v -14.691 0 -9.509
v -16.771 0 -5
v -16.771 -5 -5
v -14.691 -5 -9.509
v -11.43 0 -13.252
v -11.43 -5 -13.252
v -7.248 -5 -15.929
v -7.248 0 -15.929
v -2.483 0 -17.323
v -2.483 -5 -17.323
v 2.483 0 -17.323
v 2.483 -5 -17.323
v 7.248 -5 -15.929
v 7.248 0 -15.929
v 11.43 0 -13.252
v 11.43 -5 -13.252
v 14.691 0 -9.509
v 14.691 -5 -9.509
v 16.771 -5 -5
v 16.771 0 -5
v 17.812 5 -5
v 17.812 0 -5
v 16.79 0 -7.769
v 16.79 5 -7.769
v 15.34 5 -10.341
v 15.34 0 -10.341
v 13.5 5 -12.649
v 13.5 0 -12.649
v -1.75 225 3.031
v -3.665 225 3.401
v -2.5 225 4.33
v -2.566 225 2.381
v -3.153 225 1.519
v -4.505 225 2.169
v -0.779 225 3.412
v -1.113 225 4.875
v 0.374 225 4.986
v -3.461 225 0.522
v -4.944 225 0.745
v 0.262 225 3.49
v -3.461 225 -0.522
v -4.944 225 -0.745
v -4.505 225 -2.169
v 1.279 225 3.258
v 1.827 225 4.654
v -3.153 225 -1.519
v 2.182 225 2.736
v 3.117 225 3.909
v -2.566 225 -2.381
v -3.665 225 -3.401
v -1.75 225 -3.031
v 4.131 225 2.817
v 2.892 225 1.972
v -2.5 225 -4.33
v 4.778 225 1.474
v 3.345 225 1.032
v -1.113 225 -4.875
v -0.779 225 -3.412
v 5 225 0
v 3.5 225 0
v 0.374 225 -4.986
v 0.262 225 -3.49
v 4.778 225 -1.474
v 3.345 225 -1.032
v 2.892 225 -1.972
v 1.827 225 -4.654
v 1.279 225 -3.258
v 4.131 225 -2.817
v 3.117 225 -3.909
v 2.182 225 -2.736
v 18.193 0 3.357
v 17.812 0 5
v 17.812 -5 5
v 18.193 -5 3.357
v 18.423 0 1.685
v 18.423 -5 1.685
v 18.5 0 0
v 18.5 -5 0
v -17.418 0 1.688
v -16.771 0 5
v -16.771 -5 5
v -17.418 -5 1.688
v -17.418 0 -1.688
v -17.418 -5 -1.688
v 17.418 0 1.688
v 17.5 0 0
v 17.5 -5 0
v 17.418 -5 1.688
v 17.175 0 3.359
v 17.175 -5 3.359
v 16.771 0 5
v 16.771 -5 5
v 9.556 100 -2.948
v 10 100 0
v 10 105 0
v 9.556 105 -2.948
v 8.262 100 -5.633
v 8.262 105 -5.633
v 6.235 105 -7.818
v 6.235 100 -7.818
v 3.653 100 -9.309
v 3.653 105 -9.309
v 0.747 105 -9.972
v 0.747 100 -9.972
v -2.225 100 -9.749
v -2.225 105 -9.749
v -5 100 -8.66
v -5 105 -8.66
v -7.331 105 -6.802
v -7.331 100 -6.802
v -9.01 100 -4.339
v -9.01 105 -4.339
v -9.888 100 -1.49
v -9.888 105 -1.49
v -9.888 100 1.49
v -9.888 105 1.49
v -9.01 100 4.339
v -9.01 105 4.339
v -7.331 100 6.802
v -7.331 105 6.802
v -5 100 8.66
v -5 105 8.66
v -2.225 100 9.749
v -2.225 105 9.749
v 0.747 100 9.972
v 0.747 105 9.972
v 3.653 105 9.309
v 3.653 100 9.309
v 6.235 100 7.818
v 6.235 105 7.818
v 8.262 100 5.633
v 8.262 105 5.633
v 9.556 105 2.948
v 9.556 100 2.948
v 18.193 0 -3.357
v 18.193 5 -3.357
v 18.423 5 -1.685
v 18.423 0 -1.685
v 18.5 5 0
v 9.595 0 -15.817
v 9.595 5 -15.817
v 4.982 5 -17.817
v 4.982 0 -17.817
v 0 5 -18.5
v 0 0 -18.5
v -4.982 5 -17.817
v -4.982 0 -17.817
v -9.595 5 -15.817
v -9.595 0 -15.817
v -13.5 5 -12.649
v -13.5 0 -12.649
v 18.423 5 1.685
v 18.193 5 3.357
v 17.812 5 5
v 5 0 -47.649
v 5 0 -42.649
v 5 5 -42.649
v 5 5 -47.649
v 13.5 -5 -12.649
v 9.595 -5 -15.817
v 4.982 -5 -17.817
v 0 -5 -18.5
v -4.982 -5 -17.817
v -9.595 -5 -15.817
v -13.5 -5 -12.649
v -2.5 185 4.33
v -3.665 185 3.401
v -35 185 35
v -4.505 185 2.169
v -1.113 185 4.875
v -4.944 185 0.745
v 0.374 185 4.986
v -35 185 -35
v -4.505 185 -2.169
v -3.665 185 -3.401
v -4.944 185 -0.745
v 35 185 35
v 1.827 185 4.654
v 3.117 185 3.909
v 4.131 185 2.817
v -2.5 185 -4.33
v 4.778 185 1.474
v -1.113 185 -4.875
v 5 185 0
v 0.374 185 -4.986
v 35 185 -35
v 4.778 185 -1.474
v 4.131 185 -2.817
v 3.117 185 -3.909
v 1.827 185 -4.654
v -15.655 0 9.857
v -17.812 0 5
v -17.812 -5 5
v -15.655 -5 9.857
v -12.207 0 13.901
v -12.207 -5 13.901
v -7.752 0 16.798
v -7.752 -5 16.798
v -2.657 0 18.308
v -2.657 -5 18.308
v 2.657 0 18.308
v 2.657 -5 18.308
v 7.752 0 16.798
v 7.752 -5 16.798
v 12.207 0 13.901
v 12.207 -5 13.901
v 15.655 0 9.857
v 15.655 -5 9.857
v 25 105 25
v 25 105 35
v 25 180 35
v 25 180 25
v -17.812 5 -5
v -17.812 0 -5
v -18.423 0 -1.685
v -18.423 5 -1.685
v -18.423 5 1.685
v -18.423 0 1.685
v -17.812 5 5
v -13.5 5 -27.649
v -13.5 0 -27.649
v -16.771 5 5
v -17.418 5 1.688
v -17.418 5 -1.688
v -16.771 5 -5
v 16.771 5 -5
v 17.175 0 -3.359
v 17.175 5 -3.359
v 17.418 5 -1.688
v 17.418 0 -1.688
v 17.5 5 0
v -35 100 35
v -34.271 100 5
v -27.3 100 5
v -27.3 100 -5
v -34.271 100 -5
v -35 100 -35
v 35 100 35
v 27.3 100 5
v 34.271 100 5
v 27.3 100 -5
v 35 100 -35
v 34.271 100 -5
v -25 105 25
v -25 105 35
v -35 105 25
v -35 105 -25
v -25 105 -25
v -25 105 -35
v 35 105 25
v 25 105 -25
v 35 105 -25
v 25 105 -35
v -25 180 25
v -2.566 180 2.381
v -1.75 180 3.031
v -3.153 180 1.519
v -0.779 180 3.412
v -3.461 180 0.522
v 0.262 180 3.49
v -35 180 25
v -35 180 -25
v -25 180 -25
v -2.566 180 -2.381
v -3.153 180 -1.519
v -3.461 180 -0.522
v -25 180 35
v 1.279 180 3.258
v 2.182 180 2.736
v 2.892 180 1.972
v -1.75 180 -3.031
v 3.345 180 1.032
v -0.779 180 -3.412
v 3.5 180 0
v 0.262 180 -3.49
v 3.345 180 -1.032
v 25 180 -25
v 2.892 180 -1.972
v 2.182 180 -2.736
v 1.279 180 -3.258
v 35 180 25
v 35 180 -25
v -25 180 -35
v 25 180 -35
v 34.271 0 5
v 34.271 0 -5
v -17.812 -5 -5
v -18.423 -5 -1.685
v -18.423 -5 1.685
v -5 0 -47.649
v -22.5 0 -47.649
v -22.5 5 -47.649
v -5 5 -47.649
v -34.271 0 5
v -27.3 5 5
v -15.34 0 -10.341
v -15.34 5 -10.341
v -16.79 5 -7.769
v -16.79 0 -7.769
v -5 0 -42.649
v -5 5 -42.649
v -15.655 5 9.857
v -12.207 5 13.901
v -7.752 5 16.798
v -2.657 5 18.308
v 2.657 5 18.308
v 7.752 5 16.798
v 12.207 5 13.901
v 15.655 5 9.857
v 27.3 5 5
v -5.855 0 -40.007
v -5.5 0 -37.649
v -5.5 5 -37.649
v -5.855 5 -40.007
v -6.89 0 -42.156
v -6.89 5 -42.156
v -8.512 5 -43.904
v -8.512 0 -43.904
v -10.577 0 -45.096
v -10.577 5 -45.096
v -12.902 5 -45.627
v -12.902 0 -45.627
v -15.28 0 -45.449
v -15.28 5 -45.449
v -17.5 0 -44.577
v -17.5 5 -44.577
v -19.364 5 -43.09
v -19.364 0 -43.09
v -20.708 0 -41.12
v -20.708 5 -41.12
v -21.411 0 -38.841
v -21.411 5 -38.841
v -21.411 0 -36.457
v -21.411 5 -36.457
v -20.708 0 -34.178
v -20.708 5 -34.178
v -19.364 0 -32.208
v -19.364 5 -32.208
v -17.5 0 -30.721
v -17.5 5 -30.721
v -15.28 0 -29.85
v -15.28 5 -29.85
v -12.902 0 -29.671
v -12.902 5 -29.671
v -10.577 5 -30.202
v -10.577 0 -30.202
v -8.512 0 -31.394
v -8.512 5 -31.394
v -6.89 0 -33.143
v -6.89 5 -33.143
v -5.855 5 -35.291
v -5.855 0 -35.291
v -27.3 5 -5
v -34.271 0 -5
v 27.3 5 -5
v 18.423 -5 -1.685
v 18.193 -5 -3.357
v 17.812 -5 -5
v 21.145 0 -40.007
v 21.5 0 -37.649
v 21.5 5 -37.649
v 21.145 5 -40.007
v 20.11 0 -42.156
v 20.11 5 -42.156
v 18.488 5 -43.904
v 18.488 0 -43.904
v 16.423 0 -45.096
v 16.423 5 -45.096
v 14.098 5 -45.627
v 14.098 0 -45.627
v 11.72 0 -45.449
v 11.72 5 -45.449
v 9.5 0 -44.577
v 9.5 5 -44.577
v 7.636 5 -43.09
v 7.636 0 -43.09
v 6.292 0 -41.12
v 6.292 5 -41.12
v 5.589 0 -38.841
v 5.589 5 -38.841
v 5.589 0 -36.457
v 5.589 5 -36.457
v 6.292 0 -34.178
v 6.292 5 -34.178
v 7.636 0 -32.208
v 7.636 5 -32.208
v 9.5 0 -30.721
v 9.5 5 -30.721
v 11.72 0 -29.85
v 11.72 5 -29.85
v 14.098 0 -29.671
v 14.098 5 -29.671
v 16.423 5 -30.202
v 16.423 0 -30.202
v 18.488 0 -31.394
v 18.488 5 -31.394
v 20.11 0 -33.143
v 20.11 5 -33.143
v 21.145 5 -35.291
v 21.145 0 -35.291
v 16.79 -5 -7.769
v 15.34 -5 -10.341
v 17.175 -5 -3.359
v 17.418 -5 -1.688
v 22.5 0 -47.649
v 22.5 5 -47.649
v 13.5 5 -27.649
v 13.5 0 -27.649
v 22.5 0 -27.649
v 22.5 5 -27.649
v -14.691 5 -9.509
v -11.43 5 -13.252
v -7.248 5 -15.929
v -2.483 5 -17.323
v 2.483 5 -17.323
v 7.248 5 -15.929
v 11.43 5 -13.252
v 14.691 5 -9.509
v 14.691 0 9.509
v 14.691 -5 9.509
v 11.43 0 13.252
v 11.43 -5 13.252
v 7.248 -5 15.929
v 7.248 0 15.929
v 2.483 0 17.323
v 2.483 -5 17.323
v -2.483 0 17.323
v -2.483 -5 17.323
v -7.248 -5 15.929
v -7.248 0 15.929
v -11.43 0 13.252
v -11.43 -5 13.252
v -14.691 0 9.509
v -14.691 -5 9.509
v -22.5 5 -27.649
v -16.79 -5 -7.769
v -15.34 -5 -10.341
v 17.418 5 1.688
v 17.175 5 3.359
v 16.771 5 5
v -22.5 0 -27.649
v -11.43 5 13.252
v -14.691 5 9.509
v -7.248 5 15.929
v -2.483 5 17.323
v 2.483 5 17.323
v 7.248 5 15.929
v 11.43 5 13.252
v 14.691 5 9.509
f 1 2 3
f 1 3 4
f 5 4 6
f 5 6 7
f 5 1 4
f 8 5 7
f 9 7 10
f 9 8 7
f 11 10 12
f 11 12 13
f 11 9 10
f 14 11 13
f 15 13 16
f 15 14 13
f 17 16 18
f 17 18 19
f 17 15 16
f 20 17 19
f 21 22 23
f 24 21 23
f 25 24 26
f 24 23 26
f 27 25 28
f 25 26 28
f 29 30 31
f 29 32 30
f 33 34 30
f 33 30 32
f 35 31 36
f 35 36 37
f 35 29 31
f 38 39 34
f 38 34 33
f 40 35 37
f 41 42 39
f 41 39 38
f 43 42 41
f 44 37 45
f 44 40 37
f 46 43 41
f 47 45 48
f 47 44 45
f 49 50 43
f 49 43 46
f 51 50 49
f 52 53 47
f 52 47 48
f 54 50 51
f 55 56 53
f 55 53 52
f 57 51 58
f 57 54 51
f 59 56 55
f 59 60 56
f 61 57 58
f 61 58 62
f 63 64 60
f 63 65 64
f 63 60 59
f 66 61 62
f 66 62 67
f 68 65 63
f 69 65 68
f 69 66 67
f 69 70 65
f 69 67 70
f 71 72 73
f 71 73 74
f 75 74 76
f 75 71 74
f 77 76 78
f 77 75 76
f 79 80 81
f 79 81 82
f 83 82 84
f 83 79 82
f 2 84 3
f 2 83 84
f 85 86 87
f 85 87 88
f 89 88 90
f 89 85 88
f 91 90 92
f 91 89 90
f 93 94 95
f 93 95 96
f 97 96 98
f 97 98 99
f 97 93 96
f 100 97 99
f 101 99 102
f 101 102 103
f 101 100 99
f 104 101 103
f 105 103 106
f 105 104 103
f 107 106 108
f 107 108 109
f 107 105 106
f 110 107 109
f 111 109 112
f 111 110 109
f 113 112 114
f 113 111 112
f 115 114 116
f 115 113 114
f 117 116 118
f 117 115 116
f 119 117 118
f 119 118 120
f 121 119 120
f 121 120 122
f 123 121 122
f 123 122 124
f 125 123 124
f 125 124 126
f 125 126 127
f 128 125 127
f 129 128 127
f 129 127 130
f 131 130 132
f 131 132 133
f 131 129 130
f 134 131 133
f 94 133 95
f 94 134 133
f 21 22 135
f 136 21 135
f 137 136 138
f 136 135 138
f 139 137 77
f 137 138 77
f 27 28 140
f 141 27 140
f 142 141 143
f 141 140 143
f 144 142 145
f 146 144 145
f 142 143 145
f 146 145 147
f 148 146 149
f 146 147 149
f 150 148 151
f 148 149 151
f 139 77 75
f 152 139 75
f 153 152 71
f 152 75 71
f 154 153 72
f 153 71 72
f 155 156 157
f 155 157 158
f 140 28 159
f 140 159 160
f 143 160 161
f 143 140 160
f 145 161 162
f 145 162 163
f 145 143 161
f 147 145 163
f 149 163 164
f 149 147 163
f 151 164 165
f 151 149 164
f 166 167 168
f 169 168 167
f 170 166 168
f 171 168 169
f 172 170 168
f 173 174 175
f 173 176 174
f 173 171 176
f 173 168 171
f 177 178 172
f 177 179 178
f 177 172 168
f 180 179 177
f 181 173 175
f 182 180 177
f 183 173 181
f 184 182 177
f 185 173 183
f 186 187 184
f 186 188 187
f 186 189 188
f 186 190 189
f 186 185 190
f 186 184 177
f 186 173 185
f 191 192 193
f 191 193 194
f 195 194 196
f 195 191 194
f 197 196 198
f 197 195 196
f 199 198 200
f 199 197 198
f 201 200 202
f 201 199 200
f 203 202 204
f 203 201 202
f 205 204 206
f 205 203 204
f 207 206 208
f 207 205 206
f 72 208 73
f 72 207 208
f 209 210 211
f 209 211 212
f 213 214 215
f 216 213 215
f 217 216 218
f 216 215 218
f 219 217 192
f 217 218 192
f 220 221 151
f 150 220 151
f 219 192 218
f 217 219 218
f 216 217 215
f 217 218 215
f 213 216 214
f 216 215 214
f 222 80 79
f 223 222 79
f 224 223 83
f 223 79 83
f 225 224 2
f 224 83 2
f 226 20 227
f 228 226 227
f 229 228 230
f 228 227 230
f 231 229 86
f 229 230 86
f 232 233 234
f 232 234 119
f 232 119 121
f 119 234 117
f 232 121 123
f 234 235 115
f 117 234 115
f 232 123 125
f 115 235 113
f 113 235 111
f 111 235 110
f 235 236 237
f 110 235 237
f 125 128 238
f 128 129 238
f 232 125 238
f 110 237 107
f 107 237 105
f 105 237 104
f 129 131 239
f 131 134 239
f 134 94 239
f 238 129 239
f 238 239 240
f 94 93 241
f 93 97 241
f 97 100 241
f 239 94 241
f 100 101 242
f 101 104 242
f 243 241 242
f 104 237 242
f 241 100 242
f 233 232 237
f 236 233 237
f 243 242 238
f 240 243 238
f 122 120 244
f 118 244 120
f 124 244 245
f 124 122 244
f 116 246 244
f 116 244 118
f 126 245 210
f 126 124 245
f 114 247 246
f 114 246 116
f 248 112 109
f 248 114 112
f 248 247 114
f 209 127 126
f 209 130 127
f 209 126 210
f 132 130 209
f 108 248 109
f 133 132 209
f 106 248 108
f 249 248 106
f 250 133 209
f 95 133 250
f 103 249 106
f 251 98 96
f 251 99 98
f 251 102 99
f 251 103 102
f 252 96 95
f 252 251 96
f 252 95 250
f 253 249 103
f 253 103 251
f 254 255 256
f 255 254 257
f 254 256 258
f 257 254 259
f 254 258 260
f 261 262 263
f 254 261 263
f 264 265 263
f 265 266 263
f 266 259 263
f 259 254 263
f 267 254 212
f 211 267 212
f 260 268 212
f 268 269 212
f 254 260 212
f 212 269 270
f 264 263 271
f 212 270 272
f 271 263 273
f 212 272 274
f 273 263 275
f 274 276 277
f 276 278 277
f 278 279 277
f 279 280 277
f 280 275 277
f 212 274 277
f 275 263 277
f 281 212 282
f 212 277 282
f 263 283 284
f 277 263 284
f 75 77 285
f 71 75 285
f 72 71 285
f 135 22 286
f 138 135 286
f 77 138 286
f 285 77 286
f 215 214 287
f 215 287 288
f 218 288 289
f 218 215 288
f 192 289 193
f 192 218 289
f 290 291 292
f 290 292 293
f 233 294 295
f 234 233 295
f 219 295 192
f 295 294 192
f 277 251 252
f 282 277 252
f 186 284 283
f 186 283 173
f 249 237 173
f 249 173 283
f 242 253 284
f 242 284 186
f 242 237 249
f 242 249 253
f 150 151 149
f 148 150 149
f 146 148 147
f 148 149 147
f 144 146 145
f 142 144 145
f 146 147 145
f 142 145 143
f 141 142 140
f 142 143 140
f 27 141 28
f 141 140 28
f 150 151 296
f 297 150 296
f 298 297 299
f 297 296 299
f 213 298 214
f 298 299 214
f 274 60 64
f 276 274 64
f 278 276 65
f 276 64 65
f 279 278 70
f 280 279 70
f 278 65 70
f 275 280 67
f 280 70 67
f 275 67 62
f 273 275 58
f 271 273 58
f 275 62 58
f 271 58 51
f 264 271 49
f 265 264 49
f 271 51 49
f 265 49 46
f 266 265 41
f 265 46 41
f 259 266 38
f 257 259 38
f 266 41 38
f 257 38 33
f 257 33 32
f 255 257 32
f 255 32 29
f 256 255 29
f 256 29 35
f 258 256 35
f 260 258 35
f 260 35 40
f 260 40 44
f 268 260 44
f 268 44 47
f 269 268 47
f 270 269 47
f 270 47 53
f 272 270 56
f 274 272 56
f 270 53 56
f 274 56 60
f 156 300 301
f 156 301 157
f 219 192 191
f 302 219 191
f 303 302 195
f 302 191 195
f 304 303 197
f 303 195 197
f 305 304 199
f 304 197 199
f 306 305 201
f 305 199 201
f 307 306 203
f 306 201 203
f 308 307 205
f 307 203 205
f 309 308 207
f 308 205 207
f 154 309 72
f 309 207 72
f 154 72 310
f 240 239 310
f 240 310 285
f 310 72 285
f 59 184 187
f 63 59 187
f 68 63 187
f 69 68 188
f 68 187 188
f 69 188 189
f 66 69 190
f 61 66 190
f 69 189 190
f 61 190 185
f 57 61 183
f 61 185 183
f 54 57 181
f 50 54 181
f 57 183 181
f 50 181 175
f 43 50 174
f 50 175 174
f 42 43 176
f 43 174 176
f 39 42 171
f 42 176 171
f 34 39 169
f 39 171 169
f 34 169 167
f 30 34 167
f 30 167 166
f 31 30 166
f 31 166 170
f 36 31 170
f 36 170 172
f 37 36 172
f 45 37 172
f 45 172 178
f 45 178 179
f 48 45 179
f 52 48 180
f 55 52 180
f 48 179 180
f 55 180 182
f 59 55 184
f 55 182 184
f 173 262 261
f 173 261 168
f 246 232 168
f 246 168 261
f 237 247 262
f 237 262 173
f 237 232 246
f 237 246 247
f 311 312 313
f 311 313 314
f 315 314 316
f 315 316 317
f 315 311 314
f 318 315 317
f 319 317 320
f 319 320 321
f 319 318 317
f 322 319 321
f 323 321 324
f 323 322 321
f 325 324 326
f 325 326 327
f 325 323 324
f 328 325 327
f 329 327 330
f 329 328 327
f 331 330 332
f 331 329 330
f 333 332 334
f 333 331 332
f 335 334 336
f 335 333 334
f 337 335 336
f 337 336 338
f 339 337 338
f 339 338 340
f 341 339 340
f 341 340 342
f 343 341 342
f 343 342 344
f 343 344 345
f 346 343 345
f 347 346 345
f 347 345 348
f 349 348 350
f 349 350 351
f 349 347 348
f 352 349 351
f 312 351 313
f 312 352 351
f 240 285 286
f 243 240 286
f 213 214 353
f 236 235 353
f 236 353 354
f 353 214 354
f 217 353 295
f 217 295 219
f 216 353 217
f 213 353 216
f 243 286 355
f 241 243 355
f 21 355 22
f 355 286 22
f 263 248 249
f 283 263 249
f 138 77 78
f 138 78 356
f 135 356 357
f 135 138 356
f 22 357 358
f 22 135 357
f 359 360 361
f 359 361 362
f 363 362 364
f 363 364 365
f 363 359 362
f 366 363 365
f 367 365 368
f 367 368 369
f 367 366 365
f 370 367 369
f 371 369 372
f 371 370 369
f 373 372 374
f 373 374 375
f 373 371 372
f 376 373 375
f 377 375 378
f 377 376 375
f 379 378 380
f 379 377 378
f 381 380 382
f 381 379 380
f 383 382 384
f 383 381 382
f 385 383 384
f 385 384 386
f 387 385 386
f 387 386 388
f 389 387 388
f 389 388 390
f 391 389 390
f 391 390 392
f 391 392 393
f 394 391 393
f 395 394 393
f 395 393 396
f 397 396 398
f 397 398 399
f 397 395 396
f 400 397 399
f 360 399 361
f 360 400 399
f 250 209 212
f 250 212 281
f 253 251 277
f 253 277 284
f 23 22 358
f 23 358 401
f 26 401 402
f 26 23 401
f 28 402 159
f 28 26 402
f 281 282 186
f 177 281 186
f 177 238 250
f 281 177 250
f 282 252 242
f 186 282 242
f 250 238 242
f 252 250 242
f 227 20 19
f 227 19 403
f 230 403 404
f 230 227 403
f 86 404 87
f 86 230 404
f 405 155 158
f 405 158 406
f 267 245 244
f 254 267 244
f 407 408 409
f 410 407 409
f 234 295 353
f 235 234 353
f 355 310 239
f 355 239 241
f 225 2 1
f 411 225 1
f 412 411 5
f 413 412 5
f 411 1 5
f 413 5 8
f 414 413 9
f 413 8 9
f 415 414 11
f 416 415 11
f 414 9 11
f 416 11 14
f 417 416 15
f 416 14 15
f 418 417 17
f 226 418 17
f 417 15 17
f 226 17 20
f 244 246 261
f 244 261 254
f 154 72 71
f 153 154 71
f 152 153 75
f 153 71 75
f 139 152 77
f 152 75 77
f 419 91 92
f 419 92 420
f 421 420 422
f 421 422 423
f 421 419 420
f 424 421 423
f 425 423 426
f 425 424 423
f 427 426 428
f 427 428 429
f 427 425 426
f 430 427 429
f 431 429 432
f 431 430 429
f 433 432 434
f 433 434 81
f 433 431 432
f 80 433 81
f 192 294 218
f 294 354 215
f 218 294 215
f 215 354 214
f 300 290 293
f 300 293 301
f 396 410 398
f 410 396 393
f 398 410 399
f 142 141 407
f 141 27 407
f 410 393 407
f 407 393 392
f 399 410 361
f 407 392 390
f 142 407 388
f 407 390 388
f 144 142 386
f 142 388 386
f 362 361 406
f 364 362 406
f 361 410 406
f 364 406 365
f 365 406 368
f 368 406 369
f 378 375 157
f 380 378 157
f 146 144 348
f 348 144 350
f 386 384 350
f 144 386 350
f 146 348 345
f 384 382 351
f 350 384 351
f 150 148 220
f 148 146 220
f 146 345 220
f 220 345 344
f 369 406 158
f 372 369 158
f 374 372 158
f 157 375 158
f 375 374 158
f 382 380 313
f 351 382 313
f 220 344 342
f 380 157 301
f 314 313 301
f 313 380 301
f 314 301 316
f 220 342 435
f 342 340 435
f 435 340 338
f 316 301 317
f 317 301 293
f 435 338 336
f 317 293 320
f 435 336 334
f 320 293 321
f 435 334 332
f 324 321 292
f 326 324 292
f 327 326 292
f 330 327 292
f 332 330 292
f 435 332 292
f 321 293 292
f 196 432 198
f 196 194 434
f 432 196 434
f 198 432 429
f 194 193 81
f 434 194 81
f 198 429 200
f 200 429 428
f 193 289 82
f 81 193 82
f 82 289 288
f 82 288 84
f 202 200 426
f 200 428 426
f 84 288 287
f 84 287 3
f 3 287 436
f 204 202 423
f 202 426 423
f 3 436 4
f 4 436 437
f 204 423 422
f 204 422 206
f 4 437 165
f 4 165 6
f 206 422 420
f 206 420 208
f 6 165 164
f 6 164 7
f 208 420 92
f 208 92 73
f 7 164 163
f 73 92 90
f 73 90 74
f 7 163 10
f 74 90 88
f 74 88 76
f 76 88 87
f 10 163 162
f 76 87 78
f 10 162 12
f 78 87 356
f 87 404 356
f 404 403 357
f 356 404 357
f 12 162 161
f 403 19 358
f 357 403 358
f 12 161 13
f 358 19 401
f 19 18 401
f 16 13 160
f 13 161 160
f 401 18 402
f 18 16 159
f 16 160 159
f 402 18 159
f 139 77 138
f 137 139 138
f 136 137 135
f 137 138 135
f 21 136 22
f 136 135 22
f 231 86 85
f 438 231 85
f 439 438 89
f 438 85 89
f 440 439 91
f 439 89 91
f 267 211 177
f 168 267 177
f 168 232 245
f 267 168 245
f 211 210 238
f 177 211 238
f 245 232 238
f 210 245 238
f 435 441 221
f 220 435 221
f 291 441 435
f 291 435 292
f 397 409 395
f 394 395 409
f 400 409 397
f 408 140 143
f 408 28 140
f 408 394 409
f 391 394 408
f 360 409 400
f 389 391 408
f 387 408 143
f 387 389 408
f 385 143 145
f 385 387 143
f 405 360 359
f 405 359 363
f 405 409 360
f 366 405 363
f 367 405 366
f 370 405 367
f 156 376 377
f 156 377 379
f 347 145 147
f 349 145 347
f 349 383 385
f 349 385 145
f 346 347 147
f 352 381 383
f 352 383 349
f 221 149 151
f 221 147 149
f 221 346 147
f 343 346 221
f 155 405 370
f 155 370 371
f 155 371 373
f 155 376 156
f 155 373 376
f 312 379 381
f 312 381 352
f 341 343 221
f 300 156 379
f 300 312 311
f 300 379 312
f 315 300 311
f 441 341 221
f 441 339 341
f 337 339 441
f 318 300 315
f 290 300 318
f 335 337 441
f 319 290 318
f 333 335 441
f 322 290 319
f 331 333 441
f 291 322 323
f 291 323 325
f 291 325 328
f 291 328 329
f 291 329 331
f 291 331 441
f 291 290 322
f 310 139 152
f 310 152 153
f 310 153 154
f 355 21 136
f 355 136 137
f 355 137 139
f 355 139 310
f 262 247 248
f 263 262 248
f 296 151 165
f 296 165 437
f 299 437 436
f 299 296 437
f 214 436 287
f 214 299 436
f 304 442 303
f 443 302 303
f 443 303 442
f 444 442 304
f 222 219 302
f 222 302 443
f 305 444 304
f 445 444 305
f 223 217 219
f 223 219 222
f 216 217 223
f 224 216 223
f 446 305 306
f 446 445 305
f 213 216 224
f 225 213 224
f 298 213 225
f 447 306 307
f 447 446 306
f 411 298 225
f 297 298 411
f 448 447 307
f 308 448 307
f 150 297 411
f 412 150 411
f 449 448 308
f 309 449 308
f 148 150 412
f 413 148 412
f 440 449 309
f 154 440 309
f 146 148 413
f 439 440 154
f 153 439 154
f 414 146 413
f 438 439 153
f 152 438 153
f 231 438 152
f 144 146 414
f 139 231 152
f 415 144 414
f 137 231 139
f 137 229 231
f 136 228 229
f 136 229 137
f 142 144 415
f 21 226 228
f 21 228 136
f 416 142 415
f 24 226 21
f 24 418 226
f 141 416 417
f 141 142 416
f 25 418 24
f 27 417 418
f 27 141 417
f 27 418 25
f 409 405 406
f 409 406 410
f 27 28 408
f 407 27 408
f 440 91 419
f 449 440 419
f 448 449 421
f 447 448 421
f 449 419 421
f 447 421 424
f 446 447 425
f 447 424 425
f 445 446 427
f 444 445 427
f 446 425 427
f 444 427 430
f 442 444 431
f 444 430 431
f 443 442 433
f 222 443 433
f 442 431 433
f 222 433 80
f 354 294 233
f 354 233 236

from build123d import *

# Parameters (mm, degrees)
CONNECTOR_SLEEVE_DEPTH      = 5
CONNECTOR_SLEEVE_DEPTH_BACK = 5
SKETCH2_10_R                = 8
SKETCH2_10_W                = 6.970509831
SKETCH2_10_H                = 10
SENSOR_HOLDER_DEPTH         = 5
SKETCH2_18_W                = 6.970509831
SKETCH2_18_H                = 10
BOSS_EXTRUDE1_DEPTH         = 100
SKETCH4_W                   = 70
SKETCH4_H                   = 70
SKETCH4_R                   = 10
MOTOR_ENCLOSURE_DEPTH       = 5
SKETCH6_W                   = 10
SKETCH6_H                   = 10
MOTOR_ENCLOSURE_2_DEPTH     = 75
SKETCH7_W                   = 70
SKETCH7_H                   = 70
MOTOR_ENCLOSURE_3_DEPTH     = 5
SKETCH8_R                   = 5
BOSS_EXTRUDE5_DEPTH         = 40
SKETCH26_R                  = 3.5
CUT_EXTRUDE1_DEPTH          = 45


with BuildPart() as part:
    # Sketch2 → Connector sleeve (new body, two sides)
    with BuildSketch(Plane(origin=(0, 0, 0), x_dir=(1, 0, 0), z_dir=(0, 1, 0))) as connector_sleeve_sk:
        with BuildLine():
            Line((-16.770509831, -5), (-17.811513131, -5))
            ThreePointArc((-17.811513131, -5), (0, -18.5), (17.811513131, -5))
            Line((17.811513131, -5), (16.770509831, -5))
            ThreePointArc((16.770509831, -5), (0, -17.5), (-16.770509831, -5))
        make_face()
        with BuildLine():
            ThreePointArc((-13.5, 12.649110641), (-16.116139024, 9.084055425), (-17.811513131, 5))
            Line((-17.811513131, 5), (-16.770509831, 5))
            ThreePointArc((-16.770509831, 5), (0, 17.5), (16.770509831, 5))
            Line((16.770509831, 5), (17.811513131, 5))
            ThreePointArc((17.811513131, 5), (16.116139024, 9.084055425), (13.5, 12.649110641))
            ThreePointArc((13.5, 12.649110641), (0, 18.5), (-13.5, 12.649110641))
        make_face()
        with BuildLine():
            Line((17.811513131, 5), (16.770509831, 5))
            ThreePointArc((16.770509831, 5), (17.316667145, 2.526467688), (17.5, 0))
            ThreePointArc((17.5, 0), (17.316667145, -2.526467688), (16.770509831, -5))
            Line((16.770509831, -5), (17.811513131, -5))
            ThreePointArc((17.811513131, -5), (18.327070046, -2.523589416), (18.5, 0))
            ThreePointArc((18.5, 0), (18.327070046, 2.523589416), (17.811513131, 5))
        make_face()
        with BuildLine():
            Line((-16.770509831, 5), (-17.811513131, 5))
            ThreePointArc((-17.811513131, 5), (-18.5, 0), (-17.811513131, -5))
            Line((-17.811513131, -5), (-16.770509831, -5))
            ThreePointArc((-16.770509831, -5), (-17.5, 0), (-16.770509831, 5))
        make_face()
    extrude(amount=CONNECTOR_SLEEVE_DEPTH)
    extrude(connector_sleeve_sk.sketch, amount=-CONNECTOR_SLEEVE_DEPTH_BACK)


with BuildPart() as body_2:
    # Sketch2<10> → Sensor holder (new body)
    with BuildSketch(Plane(origin=(0, 0, 0), x_dir=(1, 0, 0), z_dir=(0, 1, 0))):
        Polygon((5, 42.649110641), (5, 47.649110641), (22.5, 47.649110641), (22.5, 27.649110641), (0, 27.649110641), (-22.5, 27.649110641), (-22.5, 47.649110641), (-5, 47.649110641), (-5, 42.649110641), align=None)
        with Locations((13.5, 37.649110641)):
            Circle(SKETCH2_10_R, mode=Mode.SUBTRACT)
        with Locations((-13.5, 37.649110641)):
            Circle(SKETCH2_10_R, mode=Mode.SUBTRACT)
        with BuildLine():
            Line((-13.5, 27.649110641), (-13.5, 12.649110641))
            ThreePointArc((-13.5, 12.649110641), (0, 18.5), (13.5, 12.649110641))
            Line((13.5, 12.649110641), (13.5, 27.649110641))
            Line((13.5, 27.649110641), (0, 27.649110641))
            Line((0, 27.649110641), (-13.5, 27.649110641))
        make_face()
        with BuildLine():
            Line((-17.811513131, 5), (-27.3, 5))
            Line((-27.3, 5), (-27.3, -5))
            Line((-27.3, -5), (-17.811513131, -5))
            ThreePointArc((-17.811513131, -5), (-18.5, 0), (-17.811513131, 5))
        make_face()
        with Locations((-30.785254916, 0)):
            Rectangle(SKETCH2_10_W, SKETCH2_10_H)
        with BuildLine():
            ThreePointArc((18.5, 0), (18.327070046, -2.523589416), (17.811513131, -5))
            Line((17.811513131, -5), (27.3, -5))
            Line((27.3, -5), (27.3, 5))
            Line((27.3, 5), (17.811513131, 5))
            ThreePointArc((17.811513131, 5), (18.327070046, 2.523589416), (18.5, 0))
        make_face()
        with Locations((30.785254916, 0)):
            Rectangle(SKETCH2_10_W, SKETCH2_10_H)
    extrude(amount=SENSOR_HOLDER_DEPTH)

    # Sketch2<18> → Boss-Extrude1 (add)
    with BuildSketch(Plane(origin=(0, 0, 0), x_dir=(1, 0, 0), z_dir=(0, 1, 0))):
        with Locations((-30.785254916, 0)):
            Rectangle(SKETCH2_18_W, SKETCH2_18_H)
        with Locations((30.785254916, 0)):
            Rectangle(SKETCH2_18_W, SKETCH2_18_H)
    extrude(amount=BOSS_EXTRUDE1_DEPTH)

    # Sketch4 → Motor enclosure (add)
    with BuildSketch(Plane(origin=(0, 100, 0), x_dir=(1, 0, 0), z_dir=(0, 1, 0))):
        Rectangle(SKETCH4_W, SKETCH4_H)
        Circle(SKETCH4_R, mode=Mode.SUBTRACT)
    extrude(amount=MOTOR_ENCLOSURE_DEPTH)

    # Sketch6 → Motor enclosure 2 (add)
    with BuildSketch(Plane(origin=(0, 105, 0), x_dir=(1, 0, 0), z_dir=(0, 1, 0))):
        with Locations((-30, 30)):
            Rectangle(SKETCH6_W, SKETCH6_H)
        with Locations((30, 30)):
            Rectangle(SKETCH6_W, SKETCH6_H)
        with Locations((30, -30)):
            Rectangle(SKETCH6_W, SKETCH6_H)
        with Locations((-30, -30)):
            Rectangle(SKETCH6_W, SKETCH6_H)
    extrude(amount=MOTOR_ENCLOSURE_2_DEPTH)

    # Sketch7 → Motor enclosure 3 (add)
    with BuildSketch(Plane(origin=(0, 180, 0), x_dir=(1, 0, 0), z_dir=(0, 1, 0))):
        Rectangle(SKETCH7_W, SKETCH7_H)
    extrude(amount=MOTOR_ENCLOSURE_3_DEPTH)

    # Sketch8 → Boss-Extrude5 (add)
    with BuildSketch(Plane(origin=(0, 185, 0), x_dir=(1, 0, 0), z_dir=(0, 1, 0))):
        Circle(SKETCH8_R)
    extrude(amount=BOSS_EXTRUDE5_DEPTH)

    # Sketch26 → Cut-Extrude1 (cut)
    with BuildSketch(Plane(origin=(0, 225, 0), x_dir=(1, 0, 0), z_dir=(0, 1, 0))):
        Circle(SKETCH26_R)
    extrude(amount=-CUT_EXTRUDE1_DEPTH, mode=Mode.SUBTRACT)


solid = Compound([part.part, body_2.part])
